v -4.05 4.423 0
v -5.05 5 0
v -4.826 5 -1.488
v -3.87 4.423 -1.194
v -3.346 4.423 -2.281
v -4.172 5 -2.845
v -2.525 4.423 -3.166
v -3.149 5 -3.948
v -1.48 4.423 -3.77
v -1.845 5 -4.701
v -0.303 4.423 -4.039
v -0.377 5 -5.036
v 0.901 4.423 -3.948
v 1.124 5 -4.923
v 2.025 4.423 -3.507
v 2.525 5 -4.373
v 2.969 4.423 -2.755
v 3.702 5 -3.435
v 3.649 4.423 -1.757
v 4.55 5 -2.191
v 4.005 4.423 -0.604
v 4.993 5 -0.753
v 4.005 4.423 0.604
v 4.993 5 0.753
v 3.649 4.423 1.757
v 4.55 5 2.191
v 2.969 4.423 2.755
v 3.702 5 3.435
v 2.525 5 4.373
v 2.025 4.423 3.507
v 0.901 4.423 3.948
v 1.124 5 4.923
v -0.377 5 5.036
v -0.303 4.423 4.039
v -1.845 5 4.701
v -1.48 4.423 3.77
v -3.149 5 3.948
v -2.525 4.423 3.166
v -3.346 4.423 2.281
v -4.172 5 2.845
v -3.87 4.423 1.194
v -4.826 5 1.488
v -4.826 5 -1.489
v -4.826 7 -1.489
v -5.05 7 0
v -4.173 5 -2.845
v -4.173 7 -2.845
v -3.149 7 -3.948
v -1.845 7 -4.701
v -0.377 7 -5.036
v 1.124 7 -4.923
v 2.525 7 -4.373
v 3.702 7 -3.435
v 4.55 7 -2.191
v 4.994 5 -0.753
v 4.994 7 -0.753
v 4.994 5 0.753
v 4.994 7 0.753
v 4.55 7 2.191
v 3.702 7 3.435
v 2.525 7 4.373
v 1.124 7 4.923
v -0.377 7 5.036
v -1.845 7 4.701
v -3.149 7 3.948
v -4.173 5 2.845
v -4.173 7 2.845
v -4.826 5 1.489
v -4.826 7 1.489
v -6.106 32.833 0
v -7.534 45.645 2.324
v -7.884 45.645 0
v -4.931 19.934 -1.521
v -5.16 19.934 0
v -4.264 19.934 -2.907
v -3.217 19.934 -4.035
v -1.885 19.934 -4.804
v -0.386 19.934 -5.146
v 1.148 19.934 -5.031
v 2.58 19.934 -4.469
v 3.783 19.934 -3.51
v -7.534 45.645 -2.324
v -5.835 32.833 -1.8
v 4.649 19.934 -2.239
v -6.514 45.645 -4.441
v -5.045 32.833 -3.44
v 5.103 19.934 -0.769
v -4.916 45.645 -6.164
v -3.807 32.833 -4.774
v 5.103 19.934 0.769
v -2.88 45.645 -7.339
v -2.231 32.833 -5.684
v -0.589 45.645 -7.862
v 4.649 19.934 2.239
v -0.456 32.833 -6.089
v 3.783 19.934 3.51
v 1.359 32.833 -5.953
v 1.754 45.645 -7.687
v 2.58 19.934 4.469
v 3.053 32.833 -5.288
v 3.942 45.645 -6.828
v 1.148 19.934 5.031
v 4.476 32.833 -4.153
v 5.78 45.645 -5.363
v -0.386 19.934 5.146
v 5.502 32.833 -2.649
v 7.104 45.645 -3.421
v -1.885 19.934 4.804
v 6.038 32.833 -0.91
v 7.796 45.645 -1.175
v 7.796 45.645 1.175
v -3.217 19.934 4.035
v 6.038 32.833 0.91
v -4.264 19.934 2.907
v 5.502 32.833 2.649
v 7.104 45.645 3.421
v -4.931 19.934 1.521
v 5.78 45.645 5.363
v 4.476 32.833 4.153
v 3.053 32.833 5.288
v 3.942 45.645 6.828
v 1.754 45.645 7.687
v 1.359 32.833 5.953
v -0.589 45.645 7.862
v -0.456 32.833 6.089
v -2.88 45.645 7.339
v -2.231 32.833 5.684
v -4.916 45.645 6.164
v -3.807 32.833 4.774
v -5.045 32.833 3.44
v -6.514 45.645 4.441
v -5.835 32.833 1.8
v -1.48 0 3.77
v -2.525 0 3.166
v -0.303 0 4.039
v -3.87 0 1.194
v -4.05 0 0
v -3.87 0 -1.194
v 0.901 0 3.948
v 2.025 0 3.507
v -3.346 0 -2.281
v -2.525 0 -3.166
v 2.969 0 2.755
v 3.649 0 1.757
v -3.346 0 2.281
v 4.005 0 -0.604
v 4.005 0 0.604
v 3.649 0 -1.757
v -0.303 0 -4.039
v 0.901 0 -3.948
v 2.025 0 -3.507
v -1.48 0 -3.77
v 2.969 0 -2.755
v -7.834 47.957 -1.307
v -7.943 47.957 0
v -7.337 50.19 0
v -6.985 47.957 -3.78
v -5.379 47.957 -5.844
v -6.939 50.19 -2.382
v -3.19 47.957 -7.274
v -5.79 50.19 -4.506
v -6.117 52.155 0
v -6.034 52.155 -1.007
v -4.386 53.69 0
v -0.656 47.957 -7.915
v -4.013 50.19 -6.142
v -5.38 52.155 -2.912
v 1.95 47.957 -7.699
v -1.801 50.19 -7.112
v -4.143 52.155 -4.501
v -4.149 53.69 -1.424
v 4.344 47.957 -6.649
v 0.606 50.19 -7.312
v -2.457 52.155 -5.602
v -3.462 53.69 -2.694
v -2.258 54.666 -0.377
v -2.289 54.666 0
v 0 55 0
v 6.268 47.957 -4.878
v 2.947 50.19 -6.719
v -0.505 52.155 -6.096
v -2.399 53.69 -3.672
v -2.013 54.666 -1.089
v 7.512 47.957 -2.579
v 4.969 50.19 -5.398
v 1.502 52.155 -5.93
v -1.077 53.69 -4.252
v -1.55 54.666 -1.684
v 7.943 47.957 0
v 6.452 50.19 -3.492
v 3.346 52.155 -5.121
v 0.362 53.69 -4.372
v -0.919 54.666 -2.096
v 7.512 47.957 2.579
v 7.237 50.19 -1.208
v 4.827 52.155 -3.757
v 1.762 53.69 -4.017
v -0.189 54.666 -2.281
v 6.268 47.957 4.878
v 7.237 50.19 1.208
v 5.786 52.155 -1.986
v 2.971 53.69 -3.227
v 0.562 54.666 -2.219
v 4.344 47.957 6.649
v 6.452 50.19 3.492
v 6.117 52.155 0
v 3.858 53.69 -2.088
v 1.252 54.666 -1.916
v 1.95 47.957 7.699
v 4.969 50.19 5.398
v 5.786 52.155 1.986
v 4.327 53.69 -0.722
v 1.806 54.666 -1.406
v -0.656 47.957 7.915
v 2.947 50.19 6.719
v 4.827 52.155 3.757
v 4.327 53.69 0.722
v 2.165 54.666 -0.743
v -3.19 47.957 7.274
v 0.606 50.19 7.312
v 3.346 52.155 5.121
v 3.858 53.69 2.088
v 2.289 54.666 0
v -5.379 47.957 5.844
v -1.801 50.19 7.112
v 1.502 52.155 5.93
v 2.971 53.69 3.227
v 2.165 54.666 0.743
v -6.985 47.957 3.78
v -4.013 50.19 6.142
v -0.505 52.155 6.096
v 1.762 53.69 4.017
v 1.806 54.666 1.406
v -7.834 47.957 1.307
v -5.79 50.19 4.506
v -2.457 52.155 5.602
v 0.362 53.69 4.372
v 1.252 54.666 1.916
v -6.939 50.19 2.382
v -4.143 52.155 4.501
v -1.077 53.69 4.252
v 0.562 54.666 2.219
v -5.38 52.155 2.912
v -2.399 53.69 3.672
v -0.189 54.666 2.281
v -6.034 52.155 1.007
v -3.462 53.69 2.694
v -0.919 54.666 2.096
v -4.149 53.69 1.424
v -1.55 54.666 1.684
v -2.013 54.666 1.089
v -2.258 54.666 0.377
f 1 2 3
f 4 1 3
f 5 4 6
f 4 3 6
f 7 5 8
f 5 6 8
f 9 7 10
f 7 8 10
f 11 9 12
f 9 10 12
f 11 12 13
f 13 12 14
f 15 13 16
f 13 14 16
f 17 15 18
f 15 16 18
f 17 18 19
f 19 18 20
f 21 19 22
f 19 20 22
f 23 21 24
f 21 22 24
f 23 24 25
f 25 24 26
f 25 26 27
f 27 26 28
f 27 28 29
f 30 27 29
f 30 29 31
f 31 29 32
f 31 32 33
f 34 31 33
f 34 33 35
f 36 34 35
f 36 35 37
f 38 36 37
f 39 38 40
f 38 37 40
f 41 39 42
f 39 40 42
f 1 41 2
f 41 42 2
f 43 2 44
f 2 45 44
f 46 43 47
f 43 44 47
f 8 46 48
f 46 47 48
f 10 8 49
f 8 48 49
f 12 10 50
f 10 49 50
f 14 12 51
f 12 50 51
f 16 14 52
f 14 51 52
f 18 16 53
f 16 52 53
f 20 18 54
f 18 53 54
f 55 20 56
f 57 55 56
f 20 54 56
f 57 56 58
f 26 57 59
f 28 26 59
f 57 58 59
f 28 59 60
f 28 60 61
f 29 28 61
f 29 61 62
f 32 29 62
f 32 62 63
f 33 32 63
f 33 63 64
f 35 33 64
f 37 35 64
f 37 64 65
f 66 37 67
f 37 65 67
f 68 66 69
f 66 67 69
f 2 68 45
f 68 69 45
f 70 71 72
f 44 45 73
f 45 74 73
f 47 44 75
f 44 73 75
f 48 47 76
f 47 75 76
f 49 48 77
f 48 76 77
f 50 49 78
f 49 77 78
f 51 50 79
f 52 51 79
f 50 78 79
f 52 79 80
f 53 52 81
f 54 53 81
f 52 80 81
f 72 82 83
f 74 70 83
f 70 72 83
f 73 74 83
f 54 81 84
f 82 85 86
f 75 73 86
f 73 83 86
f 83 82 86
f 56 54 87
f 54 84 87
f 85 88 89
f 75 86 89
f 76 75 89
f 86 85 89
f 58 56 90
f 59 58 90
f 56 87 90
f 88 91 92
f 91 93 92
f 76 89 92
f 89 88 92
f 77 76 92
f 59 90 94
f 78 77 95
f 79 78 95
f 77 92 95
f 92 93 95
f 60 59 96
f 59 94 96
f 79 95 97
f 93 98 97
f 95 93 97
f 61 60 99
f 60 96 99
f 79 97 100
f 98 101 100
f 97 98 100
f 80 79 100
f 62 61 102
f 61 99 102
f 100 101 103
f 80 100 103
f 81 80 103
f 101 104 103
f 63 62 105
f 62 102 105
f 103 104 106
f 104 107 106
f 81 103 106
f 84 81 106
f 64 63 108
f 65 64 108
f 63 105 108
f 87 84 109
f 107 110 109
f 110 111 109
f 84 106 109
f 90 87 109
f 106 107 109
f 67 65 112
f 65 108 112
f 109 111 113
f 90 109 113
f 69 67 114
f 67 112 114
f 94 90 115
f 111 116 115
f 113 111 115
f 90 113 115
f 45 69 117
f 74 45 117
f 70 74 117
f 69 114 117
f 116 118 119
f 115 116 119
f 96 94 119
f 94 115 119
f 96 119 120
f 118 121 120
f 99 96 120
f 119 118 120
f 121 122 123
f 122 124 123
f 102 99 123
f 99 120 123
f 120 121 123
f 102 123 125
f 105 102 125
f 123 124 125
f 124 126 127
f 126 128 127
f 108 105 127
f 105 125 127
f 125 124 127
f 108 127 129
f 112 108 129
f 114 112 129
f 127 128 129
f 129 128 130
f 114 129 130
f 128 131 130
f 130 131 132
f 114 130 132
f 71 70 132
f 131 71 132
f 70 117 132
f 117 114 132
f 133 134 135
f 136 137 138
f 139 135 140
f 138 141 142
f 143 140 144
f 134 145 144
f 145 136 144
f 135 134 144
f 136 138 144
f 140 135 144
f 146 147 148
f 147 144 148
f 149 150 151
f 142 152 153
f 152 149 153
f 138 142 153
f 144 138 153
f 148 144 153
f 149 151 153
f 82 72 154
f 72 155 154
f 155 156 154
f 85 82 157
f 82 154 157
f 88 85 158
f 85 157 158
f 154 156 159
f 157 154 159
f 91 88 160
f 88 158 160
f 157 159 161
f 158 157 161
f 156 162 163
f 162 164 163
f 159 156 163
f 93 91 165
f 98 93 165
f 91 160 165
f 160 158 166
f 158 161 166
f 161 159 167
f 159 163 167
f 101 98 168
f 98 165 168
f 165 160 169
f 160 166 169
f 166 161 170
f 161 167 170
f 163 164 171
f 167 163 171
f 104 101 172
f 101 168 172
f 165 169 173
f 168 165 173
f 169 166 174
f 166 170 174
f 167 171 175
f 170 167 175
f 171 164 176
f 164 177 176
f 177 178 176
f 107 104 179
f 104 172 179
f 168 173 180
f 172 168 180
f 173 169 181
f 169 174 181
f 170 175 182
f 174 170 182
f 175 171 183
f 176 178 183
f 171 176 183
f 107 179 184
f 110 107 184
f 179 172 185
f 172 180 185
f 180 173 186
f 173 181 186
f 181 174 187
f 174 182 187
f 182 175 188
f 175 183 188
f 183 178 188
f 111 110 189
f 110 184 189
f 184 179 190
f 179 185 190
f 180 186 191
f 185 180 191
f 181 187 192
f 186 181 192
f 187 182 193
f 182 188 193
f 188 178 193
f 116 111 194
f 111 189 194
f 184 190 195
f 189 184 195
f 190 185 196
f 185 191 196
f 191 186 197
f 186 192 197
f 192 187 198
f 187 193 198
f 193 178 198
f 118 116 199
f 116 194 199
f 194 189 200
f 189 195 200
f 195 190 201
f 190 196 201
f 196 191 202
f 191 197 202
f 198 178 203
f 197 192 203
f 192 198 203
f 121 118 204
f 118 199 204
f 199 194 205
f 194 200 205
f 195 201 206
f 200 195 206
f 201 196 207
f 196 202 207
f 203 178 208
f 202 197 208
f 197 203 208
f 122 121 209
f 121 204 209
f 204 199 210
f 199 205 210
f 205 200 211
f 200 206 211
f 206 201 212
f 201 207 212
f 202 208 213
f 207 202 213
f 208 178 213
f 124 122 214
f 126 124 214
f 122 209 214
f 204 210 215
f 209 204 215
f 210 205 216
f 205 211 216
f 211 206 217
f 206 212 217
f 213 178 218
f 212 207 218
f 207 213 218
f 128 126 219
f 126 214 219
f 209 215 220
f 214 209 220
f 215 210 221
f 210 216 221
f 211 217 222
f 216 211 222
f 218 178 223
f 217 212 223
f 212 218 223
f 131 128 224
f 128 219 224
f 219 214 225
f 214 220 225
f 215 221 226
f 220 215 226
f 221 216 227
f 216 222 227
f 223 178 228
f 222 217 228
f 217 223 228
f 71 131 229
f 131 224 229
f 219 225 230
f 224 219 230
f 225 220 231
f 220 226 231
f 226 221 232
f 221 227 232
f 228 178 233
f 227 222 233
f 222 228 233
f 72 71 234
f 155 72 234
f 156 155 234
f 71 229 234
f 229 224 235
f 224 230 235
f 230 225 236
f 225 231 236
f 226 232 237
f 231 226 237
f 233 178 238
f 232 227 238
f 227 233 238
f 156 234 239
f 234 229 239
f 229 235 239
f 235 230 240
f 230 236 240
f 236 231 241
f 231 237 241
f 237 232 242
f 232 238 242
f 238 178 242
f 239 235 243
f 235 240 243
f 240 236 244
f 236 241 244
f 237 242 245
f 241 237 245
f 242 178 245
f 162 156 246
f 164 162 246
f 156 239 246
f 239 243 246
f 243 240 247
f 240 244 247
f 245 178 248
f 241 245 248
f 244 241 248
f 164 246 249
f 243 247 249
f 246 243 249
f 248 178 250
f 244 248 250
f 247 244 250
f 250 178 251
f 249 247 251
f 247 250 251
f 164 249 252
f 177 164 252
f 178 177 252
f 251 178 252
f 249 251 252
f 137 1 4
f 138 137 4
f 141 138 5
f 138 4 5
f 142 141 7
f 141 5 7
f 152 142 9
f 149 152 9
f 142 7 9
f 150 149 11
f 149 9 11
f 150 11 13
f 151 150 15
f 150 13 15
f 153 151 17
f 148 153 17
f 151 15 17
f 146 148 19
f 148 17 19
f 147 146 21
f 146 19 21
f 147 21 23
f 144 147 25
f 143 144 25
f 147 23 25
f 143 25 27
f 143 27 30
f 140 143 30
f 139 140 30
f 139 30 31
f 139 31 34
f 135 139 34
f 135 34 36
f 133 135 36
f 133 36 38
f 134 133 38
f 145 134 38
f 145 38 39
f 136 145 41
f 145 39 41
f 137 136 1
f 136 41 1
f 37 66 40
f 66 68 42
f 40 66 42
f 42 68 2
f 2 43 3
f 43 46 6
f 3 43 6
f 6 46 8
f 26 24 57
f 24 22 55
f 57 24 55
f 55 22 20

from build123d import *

# Parameters (mm, degrees)
CHAMFER1_SIZE2 = 1
CHAMFER1_SIZE  = 0.577350269


with BuildPart() as part:
    # Sketch1 → Revolve1 (revolve)
    with BuildSketch(Plane.XY, mode=Mode.PRIVATE) as revolve1_sk:
        with BuildLine():
            Line((0, 0), (4.05, 0))
            Line((4.05, 0), (4.05, 5))
            Line((4.05, 5), (5.05, 5))
            Line((5.05, 5), (5.05, 7))
            ThreePointArc((5.05, 7), (5.529083978, 26.391142635), (7.88435805, 45.644677848))
            ThreePointArc((7.88435805, 45.644677848), (6.117294223, 52.155454528), (0, 55))
            Line((0, 55), (0, 0))
        make_face()
    revolve(revolve1_sk.sketch.rotate(Axis((0, 55, 0), (0, -1, 0)), 180), axis=Axis((0, 55, 0), (0, -1, 0)))

    # Chamfer1
    chamfer1_edges = [part.edges().sort_by_distance(p)[0] for p in [
        (4.05, 5, 0),
    ]]
    chamfer1_side = [part.faces().sort_by_distance(p)[0] for p in [
        (4.05, 4.988452995, 0),
    ]]
    chamfer(chamfer1_edges, length=CHAMFER1_SIZE - 0.0001, length2=CHAMFER1_SIZE2 - 0.0001, reference=chamfer1_side[0])  # a hair under: the kernel refuses the full size


solid = part.part
